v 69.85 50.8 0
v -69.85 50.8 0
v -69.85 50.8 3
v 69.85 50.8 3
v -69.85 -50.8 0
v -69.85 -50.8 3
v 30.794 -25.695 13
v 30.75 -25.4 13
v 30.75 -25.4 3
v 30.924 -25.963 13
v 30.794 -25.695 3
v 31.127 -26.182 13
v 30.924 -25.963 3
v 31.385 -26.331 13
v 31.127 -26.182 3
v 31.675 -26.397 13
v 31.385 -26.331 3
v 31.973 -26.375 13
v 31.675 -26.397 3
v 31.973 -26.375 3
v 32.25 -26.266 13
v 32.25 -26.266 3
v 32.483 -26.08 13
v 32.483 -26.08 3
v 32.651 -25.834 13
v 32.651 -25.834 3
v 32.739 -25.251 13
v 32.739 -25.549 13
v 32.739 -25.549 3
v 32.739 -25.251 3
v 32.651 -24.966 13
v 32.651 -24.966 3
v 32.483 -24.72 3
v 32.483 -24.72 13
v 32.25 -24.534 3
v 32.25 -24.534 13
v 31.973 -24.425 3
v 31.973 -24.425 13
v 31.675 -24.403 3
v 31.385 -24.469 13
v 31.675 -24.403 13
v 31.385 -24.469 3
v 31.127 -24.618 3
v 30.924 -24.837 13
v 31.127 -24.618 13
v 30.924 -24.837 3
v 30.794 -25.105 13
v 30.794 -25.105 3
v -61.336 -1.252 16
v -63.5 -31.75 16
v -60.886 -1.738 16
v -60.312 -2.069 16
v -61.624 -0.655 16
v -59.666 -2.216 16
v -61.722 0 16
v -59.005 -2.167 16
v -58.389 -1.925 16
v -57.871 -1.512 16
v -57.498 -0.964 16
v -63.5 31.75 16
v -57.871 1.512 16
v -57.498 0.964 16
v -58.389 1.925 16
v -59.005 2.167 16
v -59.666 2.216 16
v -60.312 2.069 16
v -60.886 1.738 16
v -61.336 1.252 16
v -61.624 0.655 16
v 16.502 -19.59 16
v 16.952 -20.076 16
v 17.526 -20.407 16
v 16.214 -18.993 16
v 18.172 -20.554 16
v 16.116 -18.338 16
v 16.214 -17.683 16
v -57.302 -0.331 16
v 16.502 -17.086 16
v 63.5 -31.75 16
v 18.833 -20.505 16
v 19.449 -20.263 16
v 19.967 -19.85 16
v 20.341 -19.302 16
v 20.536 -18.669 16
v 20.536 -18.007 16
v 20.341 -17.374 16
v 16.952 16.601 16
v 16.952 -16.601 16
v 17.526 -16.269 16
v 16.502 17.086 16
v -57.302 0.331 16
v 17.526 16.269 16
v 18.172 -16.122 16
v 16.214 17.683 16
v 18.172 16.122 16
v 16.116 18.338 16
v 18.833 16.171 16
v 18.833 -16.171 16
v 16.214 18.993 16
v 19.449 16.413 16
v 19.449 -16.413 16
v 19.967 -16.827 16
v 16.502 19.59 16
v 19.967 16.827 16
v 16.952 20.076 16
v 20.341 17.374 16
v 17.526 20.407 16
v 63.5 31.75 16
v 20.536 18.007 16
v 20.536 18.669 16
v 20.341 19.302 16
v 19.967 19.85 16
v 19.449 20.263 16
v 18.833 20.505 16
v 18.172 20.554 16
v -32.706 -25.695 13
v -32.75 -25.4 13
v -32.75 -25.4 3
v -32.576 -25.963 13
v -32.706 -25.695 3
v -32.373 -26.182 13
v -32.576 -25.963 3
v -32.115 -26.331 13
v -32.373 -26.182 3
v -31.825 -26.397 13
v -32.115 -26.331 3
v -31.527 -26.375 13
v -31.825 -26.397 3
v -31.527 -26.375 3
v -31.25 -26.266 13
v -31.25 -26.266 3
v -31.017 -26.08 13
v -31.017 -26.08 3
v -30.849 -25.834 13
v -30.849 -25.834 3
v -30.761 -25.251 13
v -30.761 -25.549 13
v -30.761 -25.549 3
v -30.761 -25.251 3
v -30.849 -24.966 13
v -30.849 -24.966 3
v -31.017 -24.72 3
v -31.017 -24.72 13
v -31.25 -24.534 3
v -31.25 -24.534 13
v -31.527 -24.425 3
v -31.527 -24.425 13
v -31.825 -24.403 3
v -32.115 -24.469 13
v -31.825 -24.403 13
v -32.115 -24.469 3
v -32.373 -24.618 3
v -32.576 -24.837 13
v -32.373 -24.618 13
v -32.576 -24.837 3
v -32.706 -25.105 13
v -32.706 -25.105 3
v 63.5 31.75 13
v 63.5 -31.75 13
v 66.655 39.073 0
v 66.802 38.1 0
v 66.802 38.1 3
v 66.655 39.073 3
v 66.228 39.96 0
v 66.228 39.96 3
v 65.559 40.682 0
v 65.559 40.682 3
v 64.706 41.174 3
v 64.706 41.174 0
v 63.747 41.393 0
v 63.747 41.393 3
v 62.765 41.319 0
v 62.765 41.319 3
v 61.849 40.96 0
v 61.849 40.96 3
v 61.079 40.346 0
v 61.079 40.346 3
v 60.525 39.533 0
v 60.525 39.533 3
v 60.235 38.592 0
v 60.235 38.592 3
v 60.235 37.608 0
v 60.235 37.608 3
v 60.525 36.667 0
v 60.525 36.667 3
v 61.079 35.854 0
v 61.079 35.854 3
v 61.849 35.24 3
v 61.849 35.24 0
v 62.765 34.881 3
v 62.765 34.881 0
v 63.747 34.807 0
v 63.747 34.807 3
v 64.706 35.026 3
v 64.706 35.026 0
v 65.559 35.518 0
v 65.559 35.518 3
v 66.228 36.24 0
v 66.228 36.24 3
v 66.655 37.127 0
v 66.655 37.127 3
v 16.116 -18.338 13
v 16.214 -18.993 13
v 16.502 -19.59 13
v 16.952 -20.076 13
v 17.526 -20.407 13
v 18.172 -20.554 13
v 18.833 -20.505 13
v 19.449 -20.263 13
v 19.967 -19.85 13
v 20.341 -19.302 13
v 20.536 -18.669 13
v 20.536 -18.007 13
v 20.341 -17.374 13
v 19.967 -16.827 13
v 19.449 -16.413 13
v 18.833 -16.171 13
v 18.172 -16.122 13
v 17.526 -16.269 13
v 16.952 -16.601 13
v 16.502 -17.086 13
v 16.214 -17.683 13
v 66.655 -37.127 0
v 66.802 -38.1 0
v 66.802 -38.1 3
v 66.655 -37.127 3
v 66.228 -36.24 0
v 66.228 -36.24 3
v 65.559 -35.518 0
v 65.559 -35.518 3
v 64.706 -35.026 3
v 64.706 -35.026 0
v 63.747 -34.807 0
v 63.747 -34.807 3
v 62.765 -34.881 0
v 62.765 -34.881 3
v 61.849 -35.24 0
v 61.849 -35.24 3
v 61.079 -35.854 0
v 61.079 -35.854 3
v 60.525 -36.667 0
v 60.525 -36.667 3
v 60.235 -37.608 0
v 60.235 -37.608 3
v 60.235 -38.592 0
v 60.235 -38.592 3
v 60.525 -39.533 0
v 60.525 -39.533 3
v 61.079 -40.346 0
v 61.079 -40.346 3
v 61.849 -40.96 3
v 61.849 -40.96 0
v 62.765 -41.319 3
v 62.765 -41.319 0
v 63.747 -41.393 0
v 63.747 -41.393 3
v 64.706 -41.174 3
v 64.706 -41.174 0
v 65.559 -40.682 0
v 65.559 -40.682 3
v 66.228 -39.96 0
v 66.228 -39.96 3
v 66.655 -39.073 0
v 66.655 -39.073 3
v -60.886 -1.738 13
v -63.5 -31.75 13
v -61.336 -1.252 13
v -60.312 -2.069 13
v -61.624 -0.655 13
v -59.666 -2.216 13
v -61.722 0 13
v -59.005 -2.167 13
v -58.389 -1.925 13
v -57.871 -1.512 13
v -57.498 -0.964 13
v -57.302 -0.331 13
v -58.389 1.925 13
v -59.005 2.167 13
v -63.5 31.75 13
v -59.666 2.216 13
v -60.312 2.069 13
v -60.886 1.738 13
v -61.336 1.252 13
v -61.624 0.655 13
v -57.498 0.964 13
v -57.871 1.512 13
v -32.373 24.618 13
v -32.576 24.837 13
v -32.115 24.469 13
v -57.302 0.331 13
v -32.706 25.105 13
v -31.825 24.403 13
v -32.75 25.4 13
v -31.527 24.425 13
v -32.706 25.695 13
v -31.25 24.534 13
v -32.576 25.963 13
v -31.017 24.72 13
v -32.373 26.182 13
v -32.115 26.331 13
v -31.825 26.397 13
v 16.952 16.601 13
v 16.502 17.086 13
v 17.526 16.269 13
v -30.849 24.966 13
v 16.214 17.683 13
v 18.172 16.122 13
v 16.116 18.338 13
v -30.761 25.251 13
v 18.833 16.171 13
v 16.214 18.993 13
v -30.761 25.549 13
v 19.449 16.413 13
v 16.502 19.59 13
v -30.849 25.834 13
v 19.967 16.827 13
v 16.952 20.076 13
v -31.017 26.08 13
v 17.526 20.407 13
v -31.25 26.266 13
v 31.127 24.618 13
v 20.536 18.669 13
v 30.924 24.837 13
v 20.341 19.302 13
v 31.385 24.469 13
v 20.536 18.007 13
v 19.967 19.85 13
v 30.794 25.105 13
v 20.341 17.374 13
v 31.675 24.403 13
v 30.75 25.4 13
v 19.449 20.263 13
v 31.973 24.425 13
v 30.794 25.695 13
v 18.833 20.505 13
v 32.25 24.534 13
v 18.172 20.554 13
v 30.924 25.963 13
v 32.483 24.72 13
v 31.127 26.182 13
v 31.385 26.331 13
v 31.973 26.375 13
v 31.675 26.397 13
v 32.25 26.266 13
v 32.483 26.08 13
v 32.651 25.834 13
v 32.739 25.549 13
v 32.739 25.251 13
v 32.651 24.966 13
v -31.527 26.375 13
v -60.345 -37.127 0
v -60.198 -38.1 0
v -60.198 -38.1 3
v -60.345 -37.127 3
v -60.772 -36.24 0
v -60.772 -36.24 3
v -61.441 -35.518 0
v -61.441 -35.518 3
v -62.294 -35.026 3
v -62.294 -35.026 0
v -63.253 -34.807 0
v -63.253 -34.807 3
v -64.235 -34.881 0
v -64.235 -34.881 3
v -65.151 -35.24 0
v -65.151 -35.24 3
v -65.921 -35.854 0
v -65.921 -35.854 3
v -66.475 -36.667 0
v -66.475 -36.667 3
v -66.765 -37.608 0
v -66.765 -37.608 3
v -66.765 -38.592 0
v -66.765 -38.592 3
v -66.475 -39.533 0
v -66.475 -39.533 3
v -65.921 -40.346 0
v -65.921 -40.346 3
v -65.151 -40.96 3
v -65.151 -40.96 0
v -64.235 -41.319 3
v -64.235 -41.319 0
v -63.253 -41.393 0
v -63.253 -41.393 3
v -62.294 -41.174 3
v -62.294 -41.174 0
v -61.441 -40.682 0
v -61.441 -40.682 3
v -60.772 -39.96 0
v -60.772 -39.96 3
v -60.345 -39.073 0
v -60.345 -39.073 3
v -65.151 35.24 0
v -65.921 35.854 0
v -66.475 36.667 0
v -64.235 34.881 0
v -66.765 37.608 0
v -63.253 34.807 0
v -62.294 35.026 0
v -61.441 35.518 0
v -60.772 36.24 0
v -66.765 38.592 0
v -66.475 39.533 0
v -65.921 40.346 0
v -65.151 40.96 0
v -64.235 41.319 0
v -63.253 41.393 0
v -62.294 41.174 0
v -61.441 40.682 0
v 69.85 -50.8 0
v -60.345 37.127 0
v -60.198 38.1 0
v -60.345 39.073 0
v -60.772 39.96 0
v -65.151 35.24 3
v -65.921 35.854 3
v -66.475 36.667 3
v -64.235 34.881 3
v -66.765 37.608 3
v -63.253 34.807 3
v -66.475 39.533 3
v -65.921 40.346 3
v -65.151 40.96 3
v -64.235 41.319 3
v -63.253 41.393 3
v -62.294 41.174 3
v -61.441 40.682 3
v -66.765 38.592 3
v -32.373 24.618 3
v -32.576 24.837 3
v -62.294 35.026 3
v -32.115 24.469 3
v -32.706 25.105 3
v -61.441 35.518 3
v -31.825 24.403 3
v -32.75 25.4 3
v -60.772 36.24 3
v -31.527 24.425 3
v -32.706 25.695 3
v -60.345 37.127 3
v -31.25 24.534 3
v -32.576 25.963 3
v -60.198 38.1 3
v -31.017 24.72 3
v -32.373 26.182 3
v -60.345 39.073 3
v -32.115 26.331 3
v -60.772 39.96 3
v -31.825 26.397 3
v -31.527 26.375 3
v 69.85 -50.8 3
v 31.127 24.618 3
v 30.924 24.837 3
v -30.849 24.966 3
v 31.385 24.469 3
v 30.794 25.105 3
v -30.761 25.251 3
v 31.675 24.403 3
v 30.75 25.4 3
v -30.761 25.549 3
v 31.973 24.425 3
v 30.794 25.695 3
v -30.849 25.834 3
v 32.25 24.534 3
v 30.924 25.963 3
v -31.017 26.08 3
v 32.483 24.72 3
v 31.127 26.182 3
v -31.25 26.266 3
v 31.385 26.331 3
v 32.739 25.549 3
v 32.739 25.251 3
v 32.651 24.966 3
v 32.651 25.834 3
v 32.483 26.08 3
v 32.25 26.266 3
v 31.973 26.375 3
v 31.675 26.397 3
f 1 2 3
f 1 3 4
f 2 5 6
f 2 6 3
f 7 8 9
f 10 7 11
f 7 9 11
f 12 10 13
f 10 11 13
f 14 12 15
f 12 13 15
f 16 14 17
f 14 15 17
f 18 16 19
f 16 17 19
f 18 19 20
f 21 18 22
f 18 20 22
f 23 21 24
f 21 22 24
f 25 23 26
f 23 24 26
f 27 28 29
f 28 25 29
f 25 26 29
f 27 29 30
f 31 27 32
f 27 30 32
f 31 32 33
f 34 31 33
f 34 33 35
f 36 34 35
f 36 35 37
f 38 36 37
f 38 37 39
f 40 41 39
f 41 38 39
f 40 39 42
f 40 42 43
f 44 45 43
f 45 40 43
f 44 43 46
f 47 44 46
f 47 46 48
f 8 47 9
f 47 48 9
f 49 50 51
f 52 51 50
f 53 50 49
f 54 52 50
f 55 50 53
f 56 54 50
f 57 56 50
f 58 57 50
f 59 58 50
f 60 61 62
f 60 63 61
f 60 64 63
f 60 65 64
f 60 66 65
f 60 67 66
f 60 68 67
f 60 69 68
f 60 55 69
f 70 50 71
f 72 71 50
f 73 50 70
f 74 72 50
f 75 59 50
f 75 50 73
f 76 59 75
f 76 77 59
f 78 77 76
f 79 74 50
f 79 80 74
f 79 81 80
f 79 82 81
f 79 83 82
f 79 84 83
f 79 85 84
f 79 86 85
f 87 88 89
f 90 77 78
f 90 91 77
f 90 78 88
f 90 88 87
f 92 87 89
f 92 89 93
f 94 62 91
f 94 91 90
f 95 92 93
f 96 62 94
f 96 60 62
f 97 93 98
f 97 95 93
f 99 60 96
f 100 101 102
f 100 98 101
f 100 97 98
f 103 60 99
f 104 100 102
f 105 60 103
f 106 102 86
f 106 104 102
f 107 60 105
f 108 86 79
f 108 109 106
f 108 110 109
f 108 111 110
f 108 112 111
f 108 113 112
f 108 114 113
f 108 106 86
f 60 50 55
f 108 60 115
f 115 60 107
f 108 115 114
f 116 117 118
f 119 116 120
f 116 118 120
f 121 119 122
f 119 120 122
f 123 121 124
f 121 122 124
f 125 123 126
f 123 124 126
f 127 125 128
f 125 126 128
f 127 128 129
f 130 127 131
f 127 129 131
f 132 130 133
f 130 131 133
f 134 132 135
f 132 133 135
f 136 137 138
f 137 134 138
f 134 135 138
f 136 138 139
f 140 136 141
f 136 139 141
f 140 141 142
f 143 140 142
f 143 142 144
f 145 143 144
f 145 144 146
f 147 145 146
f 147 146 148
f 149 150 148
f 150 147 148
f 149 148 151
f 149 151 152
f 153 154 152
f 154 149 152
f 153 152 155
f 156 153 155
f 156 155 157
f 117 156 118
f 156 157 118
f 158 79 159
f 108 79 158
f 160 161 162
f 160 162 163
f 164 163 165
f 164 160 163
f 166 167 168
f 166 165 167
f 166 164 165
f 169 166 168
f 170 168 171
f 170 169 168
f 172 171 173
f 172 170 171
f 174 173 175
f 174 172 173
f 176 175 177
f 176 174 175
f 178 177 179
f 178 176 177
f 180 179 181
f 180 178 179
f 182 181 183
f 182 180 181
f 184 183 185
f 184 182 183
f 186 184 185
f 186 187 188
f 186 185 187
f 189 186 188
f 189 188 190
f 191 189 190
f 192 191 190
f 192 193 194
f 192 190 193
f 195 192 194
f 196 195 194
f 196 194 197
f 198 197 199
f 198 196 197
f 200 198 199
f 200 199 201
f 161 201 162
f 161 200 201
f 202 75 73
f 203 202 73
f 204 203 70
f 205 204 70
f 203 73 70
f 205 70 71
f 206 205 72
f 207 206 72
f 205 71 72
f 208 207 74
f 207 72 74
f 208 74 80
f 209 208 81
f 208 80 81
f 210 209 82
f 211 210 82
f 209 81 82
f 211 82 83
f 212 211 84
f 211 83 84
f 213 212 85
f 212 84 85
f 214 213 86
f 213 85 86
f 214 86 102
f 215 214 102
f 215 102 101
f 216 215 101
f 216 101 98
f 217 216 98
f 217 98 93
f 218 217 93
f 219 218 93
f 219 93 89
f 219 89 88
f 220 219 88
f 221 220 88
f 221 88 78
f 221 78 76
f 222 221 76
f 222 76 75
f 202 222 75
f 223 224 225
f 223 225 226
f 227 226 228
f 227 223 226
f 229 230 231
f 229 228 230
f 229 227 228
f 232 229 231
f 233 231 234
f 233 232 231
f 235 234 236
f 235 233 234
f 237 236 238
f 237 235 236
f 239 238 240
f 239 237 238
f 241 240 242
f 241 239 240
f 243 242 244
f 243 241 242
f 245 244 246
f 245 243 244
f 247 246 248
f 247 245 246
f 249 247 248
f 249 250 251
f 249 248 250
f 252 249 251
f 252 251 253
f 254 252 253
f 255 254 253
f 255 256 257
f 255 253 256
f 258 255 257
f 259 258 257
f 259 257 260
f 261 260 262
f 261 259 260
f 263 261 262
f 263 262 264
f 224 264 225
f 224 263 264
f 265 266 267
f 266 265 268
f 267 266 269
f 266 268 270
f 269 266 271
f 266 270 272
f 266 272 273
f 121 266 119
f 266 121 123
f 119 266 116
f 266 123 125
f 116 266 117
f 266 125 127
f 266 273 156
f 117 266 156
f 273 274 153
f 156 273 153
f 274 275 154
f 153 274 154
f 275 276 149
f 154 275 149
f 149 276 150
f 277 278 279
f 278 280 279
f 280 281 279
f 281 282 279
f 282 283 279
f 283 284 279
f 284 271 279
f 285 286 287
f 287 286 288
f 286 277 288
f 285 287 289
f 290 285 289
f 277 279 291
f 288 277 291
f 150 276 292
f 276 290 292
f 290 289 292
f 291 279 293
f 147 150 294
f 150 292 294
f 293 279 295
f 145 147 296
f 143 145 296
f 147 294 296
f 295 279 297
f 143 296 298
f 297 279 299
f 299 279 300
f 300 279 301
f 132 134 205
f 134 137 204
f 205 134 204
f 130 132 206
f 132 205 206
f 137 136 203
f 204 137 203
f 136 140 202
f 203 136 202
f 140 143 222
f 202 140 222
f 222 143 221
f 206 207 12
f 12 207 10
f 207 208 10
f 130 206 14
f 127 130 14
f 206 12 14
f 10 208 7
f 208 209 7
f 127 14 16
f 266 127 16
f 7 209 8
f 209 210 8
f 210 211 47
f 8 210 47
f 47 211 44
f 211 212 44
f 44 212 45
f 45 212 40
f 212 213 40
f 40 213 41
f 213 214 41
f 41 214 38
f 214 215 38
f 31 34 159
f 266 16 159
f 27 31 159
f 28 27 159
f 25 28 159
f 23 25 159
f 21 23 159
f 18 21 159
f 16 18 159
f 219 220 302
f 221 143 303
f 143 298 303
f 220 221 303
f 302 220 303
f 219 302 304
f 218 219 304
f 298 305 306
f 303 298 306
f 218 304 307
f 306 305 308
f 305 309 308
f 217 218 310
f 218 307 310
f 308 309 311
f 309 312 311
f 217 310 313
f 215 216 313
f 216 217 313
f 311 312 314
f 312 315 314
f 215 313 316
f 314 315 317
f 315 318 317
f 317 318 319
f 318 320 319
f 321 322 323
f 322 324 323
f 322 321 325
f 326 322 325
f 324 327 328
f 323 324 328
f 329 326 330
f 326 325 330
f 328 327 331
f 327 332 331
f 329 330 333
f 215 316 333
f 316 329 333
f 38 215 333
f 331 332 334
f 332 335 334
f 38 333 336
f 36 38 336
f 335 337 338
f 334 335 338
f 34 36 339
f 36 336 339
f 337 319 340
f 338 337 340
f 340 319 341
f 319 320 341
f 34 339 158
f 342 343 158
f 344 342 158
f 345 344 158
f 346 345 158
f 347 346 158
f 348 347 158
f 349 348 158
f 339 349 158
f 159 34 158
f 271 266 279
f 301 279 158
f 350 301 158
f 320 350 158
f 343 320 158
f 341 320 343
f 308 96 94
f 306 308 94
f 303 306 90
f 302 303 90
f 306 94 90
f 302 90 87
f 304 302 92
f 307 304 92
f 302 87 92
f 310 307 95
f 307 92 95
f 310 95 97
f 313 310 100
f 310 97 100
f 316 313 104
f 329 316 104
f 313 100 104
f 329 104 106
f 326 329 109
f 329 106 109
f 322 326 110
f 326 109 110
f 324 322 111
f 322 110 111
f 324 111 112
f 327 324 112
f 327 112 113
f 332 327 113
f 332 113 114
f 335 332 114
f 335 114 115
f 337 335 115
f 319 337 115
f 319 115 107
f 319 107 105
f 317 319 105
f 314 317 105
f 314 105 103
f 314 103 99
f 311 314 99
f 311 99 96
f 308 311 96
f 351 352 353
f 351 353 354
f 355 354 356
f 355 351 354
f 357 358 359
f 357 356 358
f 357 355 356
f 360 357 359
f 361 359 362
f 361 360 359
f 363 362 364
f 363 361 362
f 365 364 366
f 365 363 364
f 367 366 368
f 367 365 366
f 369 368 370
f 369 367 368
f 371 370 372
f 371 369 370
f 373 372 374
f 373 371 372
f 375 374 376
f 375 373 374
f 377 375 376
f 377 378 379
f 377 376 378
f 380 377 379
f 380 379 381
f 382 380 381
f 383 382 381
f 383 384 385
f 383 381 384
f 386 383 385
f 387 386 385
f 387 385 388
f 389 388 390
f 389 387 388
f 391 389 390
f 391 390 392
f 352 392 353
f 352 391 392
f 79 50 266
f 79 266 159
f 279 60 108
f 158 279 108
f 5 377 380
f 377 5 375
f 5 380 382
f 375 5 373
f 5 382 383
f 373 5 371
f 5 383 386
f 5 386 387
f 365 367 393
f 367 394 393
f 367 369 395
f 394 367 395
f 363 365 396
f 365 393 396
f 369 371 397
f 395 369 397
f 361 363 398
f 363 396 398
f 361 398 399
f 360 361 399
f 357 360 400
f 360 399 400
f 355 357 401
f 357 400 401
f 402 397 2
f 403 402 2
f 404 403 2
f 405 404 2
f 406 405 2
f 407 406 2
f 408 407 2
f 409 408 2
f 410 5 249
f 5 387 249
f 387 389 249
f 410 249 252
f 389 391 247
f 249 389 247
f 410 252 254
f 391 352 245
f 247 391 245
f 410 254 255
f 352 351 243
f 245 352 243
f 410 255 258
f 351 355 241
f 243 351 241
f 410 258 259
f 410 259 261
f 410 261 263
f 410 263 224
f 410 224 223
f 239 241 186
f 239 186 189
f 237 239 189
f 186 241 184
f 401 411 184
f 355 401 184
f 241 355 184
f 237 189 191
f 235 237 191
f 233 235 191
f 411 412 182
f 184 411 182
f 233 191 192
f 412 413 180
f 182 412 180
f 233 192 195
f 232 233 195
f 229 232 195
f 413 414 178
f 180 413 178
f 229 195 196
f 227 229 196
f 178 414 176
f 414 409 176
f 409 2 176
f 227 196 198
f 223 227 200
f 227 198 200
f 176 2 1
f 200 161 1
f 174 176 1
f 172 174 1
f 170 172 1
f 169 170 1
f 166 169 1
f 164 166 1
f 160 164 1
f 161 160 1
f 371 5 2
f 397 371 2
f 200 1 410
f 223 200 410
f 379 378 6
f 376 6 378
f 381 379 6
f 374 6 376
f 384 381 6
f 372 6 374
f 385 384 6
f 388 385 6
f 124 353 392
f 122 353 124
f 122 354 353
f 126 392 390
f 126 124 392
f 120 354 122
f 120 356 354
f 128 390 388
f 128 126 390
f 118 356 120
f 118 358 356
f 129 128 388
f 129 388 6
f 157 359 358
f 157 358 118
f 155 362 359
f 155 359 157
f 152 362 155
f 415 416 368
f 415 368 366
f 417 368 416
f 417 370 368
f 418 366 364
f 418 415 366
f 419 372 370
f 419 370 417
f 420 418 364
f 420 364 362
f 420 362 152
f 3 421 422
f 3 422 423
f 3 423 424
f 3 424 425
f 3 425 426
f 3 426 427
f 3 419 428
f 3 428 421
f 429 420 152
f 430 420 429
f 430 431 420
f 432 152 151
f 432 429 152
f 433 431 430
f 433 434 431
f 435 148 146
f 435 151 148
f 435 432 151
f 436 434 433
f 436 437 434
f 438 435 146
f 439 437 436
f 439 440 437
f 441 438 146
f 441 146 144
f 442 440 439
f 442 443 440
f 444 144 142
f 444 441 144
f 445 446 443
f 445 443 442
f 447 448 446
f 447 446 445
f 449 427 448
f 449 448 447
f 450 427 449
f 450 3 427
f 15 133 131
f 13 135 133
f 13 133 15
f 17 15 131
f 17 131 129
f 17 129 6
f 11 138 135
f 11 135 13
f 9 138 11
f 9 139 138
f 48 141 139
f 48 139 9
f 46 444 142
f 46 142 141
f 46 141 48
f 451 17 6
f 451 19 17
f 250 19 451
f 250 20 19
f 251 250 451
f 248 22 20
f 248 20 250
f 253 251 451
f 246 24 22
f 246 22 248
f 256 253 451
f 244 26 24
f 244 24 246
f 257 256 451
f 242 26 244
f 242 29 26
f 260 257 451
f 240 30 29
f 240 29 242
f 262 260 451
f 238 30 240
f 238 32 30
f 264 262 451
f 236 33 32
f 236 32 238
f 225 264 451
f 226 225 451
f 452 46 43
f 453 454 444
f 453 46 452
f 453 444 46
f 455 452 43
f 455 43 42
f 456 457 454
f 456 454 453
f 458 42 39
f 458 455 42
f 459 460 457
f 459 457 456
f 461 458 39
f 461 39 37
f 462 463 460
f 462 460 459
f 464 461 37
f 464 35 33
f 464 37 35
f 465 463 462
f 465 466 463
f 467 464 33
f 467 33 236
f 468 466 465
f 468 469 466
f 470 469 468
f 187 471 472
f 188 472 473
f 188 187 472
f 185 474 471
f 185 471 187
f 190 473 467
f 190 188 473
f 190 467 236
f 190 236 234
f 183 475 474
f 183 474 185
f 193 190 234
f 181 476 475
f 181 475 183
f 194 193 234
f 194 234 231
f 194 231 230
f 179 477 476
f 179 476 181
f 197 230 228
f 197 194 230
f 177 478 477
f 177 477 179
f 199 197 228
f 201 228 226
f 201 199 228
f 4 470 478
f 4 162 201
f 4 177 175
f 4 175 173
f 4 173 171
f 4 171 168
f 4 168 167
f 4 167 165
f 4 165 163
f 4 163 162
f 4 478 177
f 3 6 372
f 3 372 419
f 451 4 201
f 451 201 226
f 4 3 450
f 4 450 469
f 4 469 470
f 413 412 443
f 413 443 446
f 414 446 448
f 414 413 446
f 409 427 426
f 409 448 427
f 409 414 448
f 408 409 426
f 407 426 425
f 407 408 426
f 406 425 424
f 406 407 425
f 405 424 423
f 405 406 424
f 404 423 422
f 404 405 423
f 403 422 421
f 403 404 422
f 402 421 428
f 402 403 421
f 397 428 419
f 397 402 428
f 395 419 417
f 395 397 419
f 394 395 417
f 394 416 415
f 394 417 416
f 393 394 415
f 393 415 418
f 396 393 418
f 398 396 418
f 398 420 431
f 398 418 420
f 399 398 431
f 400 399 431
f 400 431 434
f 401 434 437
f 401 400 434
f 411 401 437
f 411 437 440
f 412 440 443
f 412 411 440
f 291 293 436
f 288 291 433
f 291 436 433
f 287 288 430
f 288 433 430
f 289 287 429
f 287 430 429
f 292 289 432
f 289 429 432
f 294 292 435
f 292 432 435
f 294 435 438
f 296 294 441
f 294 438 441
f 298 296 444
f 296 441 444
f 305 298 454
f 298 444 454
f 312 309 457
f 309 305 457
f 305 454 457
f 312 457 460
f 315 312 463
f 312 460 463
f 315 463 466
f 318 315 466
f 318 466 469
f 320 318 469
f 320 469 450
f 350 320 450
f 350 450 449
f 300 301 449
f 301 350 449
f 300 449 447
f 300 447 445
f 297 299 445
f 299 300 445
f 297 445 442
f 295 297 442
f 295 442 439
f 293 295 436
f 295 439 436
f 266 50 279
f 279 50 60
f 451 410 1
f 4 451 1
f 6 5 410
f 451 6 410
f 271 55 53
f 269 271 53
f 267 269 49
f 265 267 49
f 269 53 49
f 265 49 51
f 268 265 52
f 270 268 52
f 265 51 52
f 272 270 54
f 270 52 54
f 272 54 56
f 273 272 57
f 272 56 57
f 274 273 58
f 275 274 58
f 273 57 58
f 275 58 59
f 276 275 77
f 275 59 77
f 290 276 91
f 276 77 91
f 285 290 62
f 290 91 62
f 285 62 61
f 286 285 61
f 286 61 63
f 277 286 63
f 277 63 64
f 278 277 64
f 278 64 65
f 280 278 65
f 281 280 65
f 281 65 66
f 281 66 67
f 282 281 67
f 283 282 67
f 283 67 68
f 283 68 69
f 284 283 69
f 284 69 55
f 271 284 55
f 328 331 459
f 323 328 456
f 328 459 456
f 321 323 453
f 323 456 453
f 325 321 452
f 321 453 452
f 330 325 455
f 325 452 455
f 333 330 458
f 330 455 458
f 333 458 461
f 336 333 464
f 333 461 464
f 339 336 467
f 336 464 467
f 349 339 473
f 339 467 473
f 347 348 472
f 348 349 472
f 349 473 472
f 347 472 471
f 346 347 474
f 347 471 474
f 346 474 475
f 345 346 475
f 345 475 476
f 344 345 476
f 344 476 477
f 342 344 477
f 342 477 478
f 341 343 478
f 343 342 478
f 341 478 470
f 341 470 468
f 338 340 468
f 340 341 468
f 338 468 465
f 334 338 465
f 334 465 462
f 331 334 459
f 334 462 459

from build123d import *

# Parameters (mm, degrees)
SKETCH1_W                      = 139.7
SKETCH1_H                      = 101.6
BOSS_EXTRUDE1_DEPTH            = 3
SKETCH2_R                      = 1
BOSS_EXTRUDE2_DEPTH            = 13
SKETCH3_W                      = 127
SKETCH3_H                      = 63.5
BOSS_EXTRUDE3_DEPTH            = 3
CUT_EXTRUDE1_DEPTH             = 88.342214879
CUT_EXTRUDE1_DEPTH_BACK        = 88.342214879
SKETCH4_R                      = 3.302
CUT_EXTRUDE2_REACH             = 89.839
SKETCH5_R                      = 2.2225
CUT_EXTRUDE2_DIRECTION_2_DEPTH = 88.838843913


with BuildPart() as part:
    # Sketch1 → Boss-Extrude1 (new body)
    with BuildSketch(Plane.XY):
        Rectangle(SKETCH1_W, SKETCH1_H)
    extrude(amount=BOSS_EXTRUDE1_DEPTH)

    # Sketch2 → Boss-Extrude2 (add)
    with BuildSketch(Plane.XY.offset(3)):
        with Locations(Location((-31.75, 25.4, 0), (0, 0, 180))):
            Circle(SKETCH2_R)
        with Locations(Location((31.75, 25.4, 0), (0, 0, 180))):
            Circle(SKETCH2_R)
        with Locations(Location((31.75, -25.4, 0), (0, 0, 180))):
            Circle(SKETCH2_R)
        with Locations(Location((-31.75, -25.4, 0), (0, 0, 180))):
            Circle(SKETCH2_R)
    extrude(amount=BOSS_EXTRUDE2_DEPTH)

    # Sketch3 → Boss-Extrude3 (add)
    with BuildSketch(Plane.XY.offset(16)):
        Rectangle(SKETCH3_W, SKETCH3_H)
    extrude(amount=-BOSS_EXTRUDE3_DEPTH)

    # Sketch4 → Cut-Extrude1 (cut, two sides: drawn at the far end of the back side and taken through both)
    with BuildSketch(Plane.XY.offset(3).offset(-CUT_EXTRUDE1_DEPTH_BACK)):
        with Locations((-63.5, -38.1)):
            Circle(SKETCH4_R)
        with Locations((63.5, 38.1)):
            Circle(SKETCH4_R)
        with Locations((-63.5, 38.1)):
            Circle(SKETCH4_R)
        with Locations((63.5, -38.1)):
            Circle(SKETCH4_R)
    extrude(amount=CUT_EXTRUDE1_DEPTH + CUT_EXTRUDE1_DEPTH_BACK, mode=Mode.SUBTRACT)

    # Sketch5 → Cut-Extrude2 (cut, up to next)
    with BuildSketch(Plane.XY.offset(16), mode=Mode.PRIVATE) as cut_extrude2_sk1:
        with Locations(Location((-59.5, 0, 0), (0, 0, 180))):
            Circle(SKETCH5_R)
    cut_extrude2_tool1 = extrude(cut_extrude2_sk1.sketch, amount=-CUT_EXTRUDE2_REACH, mode=Mode.PRIVATE) & part.part
    # Sketch5 → Cut-Extrude2 (cut, up to next)
    with BuildSketch(Plane.XY.offset(16), mode=Mode.PRIVATE) as cut_extrude2_sk2:
        with Locations(Location((18.338183986, -18.338183986, 0), (0, 0, 180))):
            Circle(SKETCH5_R)
    cut_extrude2_tool2 = extrude(cut_extrude2_sk2.sketch, amount=-CUT_EXTRUDE2_REACH, mode=Mode.PRIVATE) & part.part
    # Sketch5 → Cut-Extrude2 (cut, up to next)
    with BuildSketch(Plane.XY.offset(16), mode=Mode.PRIVATE) as cut_extrude2_sk3:
        with Locations(Location((18.338183986, 18.338183986, 0), (0, 0, 180))):
            Circle(SKETCH5_R)
    cut_extrude2_tool3 = extrude(cut_extrude2_sk3.sketch, amount=-CUT_EXTRUDE2_REACH, mode=Mode.PRIVATE) & part.part
    add(cut_extrude2_tool1.solids().sort_by_distance((-59.5, 0, 16))[0], mode=Mode.SUBTRACT)
    add(cut_extrude2_tool2.solids().sort_by_distance((18.338184, -18.338184, 16))[0], mode=Mode.SUBTRACT)
    add(cut_extrude2_tool3.solids().sort_by_distance((18.338184, 18.338184, 16))[0], mode=Mode.SUBTRACT)

    # Sketch5 → Cut-Extrude2 direction 2 (cut)
    with BuildSketch(Plane.XY.offset(16)):
        with Locations(Location((-59.5, 0, 0), (0, 0, 180))):
            Circle(SKETCH5_R)
        with Locations(Location((18.338183986, -18.338183986, 0), (0, 0, 180))):
            Circle(SKETCH5_R)
        with Locations(Location((18.338183986, 18.338183986, 0), (0, 0, 180))):
            Circle(SKETCH5_R)
    extrude(amount=CUT_EXTRUDE2_DIRECTION_2_DEPTH, mode=Mode.SUBTRACT)


solid = part.part
